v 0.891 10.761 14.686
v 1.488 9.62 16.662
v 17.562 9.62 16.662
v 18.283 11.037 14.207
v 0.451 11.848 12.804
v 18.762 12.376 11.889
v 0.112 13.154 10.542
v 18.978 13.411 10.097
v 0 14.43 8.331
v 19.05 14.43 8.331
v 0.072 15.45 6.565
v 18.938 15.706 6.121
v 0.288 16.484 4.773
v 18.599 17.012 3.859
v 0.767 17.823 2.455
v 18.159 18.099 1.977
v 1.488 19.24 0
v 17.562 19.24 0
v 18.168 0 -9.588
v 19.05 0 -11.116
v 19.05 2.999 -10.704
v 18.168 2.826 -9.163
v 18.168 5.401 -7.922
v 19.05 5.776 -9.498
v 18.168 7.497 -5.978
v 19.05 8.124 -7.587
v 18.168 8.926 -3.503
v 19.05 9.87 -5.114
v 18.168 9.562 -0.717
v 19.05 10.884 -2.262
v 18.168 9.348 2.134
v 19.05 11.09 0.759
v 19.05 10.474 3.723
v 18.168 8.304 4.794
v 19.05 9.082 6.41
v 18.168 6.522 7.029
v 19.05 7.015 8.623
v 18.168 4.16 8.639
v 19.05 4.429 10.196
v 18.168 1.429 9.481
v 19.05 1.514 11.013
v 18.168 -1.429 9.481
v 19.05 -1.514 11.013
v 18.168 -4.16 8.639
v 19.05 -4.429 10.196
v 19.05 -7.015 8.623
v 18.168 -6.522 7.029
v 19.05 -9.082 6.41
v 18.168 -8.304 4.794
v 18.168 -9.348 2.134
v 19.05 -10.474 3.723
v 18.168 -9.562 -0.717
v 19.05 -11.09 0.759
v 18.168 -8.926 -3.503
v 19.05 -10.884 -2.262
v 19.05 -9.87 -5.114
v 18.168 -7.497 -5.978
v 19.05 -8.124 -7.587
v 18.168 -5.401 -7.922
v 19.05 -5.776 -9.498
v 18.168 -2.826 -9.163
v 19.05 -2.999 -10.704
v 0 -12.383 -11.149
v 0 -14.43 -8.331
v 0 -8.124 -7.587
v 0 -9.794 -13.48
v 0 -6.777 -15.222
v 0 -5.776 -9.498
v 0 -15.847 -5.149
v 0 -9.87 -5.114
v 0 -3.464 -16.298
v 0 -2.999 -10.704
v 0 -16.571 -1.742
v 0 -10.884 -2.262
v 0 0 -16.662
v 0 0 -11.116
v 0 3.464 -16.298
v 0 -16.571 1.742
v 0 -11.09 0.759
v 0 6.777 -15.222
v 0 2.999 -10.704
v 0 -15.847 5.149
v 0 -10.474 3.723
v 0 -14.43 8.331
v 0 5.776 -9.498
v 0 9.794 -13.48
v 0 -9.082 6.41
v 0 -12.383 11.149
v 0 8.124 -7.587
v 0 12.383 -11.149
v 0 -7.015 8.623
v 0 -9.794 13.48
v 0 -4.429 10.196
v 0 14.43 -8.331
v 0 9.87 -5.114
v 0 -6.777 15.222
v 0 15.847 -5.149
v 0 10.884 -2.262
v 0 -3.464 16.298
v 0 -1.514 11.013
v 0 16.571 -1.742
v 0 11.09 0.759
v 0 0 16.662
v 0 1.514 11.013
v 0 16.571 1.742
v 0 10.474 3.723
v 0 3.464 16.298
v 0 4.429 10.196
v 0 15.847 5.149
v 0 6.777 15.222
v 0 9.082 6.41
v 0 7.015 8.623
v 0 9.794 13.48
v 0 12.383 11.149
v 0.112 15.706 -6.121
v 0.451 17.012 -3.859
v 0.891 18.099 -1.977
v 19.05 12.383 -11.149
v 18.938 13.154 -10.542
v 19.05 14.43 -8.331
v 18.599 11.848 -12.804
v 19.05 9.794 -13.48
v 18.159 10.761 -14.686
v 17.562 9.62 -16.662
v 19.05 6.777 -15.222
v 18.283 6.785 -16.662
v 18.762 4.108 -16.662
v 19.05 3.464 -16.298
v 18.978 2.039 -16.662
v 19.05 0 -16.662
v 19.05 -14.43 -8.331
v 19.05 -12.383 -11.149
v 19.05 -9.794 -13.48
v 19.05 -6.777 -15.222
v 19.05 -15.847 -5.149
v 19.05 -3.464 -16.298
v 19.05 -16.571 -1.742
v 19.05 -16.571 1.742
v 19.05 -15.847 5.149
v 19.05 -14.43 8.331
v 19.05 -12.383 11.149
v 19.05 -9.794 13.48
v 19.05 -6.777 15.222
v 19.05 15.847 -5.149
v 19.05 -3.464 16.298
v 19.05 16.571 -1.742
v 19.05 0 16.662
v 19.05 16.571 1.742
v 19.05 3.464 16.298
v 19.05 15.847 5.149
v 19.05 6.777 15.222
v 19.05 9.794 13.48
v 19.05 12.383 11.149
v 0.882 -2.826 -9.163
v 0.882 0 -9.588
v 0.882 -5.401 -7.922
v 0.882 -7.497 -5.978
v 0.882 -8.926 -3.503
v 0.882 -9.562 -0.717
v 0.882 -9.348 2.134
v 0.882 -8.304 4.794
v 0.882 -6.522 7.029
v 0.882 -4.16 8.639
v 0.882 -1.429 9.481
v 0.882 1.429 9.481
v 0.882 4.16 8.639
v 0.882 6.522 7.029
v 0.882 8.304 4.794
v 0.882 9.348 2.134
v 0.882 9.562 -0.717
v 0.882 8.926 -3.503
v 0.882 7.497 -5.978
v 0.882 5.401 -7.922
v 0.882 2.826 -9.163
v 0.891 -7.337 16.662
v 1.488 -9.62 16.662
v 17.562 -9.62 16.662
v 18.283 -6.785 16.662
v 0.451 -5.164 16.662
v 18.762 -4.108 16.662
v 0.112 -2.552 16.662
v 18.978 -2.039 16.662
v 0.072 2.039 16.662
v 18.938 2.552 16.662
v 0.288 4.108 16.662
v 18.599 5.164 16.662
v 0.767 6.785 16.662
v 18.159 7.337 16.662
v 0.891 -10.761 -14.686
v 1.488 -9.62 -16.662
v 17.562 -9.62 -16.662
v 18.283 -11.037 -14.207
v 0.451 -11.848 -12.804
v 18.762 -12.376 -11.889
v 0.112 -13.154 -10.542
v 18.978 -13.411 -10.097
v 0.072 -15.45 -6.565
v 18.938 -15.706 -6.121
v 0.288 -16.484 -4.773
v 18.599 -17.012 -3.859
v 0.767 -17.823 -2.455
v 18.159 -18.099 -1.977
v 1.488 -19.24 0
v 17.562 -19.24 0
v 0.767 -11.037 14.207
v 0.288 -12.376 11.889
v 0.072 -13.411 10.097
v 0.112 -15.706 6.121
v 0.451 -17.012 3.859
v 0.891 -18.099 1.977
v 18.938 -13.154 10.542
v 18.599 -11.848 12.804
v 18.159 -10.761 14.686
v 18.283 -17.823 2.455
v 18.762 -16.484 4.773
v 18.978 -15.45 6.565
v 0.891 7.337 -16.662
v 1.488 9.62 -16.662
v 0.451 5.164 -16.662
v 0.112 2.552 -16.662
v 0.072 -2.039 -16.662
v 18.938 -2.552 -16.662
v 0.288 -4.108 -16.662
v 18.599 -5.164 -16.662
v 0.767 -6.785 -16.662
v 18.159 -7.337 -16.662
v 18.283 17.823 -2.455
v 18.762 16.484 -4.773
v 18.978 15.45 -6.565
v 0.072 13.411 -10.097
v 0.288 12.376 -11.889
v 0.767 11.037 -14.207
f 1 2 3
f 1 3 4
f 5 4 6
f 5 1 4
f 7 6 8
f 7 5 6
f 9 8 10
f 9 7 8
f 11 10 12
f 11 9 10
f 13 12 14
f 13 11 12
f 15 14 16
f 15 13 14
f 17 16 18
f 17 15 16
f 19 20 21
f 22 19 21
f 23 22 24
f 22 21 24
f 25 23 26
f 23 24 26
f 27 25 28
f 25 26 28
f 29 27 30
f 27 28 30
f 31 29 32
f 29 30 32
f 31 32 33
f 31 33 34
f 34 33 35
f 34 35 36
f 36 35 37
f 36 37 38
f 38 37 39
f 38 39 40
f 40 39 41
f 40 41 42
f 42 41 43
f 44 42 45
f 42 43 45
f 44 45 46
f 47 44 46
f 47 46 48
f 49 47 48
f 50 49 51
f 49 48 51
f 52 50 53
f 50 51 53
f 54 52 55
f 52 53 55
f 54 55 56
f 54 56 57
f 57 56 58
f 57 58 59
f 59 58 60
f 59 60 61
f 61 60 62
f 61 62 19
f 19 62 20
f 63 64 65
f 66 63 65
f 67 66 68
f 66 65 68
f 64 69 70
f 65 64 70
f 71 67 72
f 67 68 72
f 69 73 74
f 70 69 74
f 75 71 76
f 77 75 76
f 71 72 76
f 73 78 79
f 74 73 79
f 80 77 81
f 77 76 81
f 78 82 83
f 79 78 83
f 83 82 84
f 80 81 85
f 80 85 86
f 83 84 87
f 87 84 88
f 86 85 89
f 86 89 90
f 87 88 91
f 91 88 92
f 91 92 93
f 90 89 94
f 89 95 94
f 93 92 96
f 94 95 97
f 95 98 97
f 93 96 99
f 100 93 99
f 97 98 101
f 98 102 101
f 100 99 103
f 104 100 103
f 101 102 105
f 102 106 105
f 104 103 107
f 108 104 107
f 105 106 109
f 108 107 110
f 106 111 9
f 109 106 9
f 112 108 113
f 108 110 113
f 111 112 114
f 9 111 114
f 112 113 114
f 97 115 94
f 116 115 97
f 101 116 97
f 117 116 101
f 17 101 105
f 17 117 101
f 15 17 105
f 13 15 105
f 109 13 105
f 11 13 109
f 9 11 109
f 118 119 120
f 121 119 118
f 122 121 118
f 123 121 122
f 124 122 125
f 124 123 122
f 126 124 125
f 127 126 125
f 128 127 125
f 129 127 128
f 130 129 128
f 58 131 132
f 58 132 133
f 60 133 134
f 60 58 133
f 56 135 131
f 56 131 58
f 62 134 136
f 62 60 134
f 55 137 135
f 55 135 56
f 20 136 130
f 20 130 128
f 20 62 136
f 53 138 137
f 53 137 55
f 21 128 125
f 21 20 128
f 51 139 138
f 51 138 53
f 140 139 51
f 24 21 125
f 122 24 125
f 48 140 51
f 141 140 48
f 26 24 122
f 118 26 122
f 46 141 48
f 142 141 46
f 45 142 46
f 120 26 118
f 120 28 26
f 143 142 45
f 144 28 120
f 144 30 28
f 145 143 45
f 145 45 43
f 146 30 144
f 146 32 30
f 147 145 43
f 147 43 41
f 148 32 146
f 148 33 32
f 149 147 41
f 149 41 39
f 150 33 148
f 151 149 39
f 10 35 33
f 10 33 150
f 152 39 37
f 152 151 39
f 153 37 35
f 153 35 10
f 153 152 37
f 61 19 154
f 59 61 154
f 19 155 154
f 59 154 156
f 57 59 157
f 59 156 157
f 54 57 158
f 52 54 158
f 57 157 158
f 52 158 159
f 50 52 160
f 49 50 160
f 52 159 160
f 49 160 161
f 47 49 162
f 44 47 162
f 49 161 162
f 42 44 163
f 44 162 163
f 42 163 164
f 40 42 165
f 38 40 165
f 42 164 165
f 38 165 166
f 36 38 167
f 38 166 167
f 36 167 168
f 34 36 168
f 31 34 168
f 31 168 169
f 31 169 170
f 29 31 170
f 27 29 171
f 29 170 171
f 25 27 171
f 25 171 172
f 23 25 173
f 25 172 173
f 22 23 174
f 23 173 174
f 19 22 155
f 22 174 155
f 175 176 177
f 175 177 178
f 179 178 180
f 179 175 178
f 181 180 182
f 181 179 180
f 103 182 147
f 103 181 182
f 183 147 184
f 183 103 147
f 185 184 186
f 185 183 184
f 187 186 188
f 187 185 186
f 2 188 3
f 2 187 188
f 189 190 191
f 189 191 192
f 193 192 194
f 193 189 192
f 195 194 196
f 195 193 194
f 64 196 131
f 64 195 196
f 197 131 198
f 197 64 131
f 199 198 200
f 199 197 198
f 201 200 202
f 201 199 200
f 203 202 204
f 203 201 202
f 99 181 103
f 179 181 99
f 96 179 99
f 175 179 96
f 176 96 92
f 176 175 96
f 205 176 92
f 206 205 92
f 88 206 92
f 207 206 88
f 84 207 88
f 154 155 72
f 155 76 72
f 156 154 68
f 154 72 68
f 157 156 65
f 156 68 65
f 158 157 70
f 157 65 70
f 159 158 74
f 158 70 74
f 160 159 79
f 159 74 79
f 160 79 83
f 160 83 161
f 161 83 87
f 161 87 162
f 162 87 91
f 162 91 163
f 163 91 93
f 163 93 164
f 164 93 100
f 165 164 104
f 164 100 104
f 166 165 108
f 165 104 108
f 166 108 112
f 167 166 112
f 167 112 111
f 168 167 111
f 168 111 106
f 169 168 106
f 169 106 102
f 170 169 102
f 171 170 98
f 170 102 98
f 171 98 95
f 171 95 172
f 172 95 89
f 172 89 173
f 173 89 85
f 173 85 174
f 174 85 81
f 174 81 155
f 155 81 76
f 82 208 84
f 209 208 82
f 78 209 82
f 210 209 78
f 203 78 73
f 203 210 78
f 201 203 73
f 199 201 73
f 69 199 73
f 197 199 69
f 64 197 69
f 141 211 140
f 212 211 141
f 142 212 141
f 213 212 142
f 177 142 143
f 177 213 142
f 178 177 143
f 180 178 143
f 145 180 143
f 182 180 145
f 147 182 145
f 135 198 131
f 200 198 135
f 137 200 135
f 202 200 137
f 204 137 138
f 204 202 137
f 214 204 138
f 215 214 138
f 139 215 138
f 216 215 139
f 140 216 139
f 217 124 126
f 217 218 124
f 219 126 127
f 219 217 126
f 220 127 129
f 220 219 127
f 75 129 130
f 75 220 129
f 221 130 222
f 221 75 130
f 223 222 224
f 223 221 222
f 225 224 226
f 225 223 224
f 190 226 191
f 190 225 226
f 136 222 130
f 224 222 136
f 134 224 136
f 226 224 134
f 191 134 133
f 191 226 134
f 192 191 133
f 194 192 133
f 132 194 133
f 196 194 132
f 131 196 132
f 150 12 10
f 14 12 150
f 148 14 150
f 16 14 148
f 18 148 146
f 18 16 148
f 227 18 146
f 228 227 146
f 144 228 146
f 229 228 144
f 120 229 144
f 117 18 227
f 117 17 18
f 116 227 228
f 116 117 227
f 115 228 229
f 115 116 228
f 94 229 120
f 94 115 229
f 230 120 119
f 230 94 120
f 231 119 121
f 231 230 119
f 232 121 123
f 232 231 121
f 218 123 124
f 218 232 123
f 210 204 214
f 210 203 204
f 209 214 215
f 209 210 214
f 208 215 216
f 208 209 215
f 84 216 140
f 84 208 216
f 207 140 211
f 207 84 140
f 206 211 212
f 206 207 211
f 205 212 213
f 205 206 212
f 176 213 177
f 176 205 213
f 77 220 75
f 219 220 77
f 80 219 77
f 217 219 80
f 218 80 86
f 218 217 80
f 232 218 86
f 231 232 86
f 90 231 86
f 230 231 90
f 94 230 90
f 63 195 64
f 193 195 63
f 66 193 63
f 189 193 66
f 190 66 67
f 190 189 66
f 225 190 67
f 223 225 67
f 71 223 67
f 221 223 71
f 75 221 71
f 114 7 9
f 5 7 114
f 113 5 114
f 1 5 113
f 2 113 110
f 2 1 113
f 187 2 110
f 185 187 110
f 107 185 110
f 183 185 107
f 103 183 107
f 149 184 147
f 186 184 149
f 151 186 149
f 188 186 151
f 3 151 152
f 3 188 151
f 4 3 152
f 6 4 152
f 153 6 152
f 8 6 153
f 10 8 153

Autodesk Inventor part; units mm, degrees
ref_plane "YZ Plane" through (0, 0, 0) normal (1, 0, 0) x (0, 1, 0)
ref_plane "XZ Plane" through (0, 0, 0) normal (0, 1, 0) x (-1, 0, 0)
sketch "Sketch1" plane through (0, 0, 0) normal (1, 0, 0) x (0, 1, 0)
  line L0 (-19.2401, 0) -> (-9.62, 16.6624)
  line L1 (-9.62, 16.6624) -> (9.62, 16.6624)
  line L2 (9.62, 16.6624) -> (19.2401, 0)
  line L3 (19.2401, 0) -> (9.62, -16.6624)
  line L4 (9.62, -16.6624) -> (-9.62, -16.6624)
  line L5 (-9.62, -16.6624) -> (-19.2401, 0)
  point P0 (0, 0)
  point P1 (0, 0)
  dimension "d0" = 38.4802
extrude "Body" add sketch "Sketch1" along normal blind 19.05
sketch "Sketch2" plane through (0, 0, 0) normal (0, 0, 1) x (1, 0, 0)
  line L0 (0, 9.62) -> (0, 19.2401) projected
  line L1 (0, 19.2401) -> (19.05, 19.2401) projected
  line L2 (19.05, 9.62) -> (19.05, 19.2401) projected
  line L3 (-3.81, 0) -> (22.86, 0) projected
  line L4 (1.4882, 19.2401) -> (0, 16.6624)
  line L5 (17.5618, 19.2401) -> (19.05, 16.6624)
  dimension "d3" = 30
  dimension "d4" = 30
  dimension "d5" = 33.3248
  dimension "d6" = 33.3248
revolve "Chamfer1" cut sketch "Sketch2" angle 360 about axis through (-10, 0, 0) along (1, 0, 0)
sketch "Sketch3" plane through (19.05, 0, 0) normal (1, 0, 0) x (0, 0, -1)
  arc A0 (-8.3312, -14.4301) -> (8.3312, -14.4301) centre (0, 0) ccw projected
hole "Thread" at (19.05, 0, 0) direction (-1, 0, 0) diameter 19.177 end through all thread size "7/8-9 UNC" class "2B" standard "ANSI Unified Screw Threads"
chamfer "Chamfer2" distance 1.5276 angle 30 1 edges at (19.05, 0, 9.5885) measured on face at (19.05, 14.2203, -0.3853)
chamfer "Chamfer3" distance 1.5276 angle 30 1 edges at (0, 0, 9.5885) measured on face at (0, 14.2203, -0.3853)
ref_plane "Work Plane1" through (-35.3023, 0, 0) normal (0, -0.866, -0.5) x (1, 0, 0)
equation "\"d0\" = 1.1547 * SW"
equation "\"d1\" = KOH"
equation "\"d3\" = ANG1"
equation "\"d4\" = ANG2"
equation "\"d5\" = SW0"
equation "\"d6\" = SW01"
equation "\"d8\" = -0.5 * GD1 + 0.5 * NND"
equation "\"d40\" = -0.5 * GD1 + 0.5 * NND"
equation "\"d10\" = -0.5 * GD1 + 0.5 * NND"
equation "\"d41\" = -0.5 * GD1 + 0.5 * NND"
equation "\"ANG1\" = 30deg"
equation "\"ANG2\" = 30deg"
equation "\"NND\" = 22.225"
equation "\"KOH\" = 19.05"
equation "\"SW\" = 33.3248"
equation "\"SW0\" = SW"
equation "\"SW01\" = SW"
equation "\"THREADDIA\" = 22.225"
equation "\"TOA\" = 30deg"
equation "\"E0\" = 1.155 * SW"
equation "\"GD1\" = 19.169855"
properties part number "ANSI B18.2.2 - 7/8 - 9" material "Steel, Mild"
